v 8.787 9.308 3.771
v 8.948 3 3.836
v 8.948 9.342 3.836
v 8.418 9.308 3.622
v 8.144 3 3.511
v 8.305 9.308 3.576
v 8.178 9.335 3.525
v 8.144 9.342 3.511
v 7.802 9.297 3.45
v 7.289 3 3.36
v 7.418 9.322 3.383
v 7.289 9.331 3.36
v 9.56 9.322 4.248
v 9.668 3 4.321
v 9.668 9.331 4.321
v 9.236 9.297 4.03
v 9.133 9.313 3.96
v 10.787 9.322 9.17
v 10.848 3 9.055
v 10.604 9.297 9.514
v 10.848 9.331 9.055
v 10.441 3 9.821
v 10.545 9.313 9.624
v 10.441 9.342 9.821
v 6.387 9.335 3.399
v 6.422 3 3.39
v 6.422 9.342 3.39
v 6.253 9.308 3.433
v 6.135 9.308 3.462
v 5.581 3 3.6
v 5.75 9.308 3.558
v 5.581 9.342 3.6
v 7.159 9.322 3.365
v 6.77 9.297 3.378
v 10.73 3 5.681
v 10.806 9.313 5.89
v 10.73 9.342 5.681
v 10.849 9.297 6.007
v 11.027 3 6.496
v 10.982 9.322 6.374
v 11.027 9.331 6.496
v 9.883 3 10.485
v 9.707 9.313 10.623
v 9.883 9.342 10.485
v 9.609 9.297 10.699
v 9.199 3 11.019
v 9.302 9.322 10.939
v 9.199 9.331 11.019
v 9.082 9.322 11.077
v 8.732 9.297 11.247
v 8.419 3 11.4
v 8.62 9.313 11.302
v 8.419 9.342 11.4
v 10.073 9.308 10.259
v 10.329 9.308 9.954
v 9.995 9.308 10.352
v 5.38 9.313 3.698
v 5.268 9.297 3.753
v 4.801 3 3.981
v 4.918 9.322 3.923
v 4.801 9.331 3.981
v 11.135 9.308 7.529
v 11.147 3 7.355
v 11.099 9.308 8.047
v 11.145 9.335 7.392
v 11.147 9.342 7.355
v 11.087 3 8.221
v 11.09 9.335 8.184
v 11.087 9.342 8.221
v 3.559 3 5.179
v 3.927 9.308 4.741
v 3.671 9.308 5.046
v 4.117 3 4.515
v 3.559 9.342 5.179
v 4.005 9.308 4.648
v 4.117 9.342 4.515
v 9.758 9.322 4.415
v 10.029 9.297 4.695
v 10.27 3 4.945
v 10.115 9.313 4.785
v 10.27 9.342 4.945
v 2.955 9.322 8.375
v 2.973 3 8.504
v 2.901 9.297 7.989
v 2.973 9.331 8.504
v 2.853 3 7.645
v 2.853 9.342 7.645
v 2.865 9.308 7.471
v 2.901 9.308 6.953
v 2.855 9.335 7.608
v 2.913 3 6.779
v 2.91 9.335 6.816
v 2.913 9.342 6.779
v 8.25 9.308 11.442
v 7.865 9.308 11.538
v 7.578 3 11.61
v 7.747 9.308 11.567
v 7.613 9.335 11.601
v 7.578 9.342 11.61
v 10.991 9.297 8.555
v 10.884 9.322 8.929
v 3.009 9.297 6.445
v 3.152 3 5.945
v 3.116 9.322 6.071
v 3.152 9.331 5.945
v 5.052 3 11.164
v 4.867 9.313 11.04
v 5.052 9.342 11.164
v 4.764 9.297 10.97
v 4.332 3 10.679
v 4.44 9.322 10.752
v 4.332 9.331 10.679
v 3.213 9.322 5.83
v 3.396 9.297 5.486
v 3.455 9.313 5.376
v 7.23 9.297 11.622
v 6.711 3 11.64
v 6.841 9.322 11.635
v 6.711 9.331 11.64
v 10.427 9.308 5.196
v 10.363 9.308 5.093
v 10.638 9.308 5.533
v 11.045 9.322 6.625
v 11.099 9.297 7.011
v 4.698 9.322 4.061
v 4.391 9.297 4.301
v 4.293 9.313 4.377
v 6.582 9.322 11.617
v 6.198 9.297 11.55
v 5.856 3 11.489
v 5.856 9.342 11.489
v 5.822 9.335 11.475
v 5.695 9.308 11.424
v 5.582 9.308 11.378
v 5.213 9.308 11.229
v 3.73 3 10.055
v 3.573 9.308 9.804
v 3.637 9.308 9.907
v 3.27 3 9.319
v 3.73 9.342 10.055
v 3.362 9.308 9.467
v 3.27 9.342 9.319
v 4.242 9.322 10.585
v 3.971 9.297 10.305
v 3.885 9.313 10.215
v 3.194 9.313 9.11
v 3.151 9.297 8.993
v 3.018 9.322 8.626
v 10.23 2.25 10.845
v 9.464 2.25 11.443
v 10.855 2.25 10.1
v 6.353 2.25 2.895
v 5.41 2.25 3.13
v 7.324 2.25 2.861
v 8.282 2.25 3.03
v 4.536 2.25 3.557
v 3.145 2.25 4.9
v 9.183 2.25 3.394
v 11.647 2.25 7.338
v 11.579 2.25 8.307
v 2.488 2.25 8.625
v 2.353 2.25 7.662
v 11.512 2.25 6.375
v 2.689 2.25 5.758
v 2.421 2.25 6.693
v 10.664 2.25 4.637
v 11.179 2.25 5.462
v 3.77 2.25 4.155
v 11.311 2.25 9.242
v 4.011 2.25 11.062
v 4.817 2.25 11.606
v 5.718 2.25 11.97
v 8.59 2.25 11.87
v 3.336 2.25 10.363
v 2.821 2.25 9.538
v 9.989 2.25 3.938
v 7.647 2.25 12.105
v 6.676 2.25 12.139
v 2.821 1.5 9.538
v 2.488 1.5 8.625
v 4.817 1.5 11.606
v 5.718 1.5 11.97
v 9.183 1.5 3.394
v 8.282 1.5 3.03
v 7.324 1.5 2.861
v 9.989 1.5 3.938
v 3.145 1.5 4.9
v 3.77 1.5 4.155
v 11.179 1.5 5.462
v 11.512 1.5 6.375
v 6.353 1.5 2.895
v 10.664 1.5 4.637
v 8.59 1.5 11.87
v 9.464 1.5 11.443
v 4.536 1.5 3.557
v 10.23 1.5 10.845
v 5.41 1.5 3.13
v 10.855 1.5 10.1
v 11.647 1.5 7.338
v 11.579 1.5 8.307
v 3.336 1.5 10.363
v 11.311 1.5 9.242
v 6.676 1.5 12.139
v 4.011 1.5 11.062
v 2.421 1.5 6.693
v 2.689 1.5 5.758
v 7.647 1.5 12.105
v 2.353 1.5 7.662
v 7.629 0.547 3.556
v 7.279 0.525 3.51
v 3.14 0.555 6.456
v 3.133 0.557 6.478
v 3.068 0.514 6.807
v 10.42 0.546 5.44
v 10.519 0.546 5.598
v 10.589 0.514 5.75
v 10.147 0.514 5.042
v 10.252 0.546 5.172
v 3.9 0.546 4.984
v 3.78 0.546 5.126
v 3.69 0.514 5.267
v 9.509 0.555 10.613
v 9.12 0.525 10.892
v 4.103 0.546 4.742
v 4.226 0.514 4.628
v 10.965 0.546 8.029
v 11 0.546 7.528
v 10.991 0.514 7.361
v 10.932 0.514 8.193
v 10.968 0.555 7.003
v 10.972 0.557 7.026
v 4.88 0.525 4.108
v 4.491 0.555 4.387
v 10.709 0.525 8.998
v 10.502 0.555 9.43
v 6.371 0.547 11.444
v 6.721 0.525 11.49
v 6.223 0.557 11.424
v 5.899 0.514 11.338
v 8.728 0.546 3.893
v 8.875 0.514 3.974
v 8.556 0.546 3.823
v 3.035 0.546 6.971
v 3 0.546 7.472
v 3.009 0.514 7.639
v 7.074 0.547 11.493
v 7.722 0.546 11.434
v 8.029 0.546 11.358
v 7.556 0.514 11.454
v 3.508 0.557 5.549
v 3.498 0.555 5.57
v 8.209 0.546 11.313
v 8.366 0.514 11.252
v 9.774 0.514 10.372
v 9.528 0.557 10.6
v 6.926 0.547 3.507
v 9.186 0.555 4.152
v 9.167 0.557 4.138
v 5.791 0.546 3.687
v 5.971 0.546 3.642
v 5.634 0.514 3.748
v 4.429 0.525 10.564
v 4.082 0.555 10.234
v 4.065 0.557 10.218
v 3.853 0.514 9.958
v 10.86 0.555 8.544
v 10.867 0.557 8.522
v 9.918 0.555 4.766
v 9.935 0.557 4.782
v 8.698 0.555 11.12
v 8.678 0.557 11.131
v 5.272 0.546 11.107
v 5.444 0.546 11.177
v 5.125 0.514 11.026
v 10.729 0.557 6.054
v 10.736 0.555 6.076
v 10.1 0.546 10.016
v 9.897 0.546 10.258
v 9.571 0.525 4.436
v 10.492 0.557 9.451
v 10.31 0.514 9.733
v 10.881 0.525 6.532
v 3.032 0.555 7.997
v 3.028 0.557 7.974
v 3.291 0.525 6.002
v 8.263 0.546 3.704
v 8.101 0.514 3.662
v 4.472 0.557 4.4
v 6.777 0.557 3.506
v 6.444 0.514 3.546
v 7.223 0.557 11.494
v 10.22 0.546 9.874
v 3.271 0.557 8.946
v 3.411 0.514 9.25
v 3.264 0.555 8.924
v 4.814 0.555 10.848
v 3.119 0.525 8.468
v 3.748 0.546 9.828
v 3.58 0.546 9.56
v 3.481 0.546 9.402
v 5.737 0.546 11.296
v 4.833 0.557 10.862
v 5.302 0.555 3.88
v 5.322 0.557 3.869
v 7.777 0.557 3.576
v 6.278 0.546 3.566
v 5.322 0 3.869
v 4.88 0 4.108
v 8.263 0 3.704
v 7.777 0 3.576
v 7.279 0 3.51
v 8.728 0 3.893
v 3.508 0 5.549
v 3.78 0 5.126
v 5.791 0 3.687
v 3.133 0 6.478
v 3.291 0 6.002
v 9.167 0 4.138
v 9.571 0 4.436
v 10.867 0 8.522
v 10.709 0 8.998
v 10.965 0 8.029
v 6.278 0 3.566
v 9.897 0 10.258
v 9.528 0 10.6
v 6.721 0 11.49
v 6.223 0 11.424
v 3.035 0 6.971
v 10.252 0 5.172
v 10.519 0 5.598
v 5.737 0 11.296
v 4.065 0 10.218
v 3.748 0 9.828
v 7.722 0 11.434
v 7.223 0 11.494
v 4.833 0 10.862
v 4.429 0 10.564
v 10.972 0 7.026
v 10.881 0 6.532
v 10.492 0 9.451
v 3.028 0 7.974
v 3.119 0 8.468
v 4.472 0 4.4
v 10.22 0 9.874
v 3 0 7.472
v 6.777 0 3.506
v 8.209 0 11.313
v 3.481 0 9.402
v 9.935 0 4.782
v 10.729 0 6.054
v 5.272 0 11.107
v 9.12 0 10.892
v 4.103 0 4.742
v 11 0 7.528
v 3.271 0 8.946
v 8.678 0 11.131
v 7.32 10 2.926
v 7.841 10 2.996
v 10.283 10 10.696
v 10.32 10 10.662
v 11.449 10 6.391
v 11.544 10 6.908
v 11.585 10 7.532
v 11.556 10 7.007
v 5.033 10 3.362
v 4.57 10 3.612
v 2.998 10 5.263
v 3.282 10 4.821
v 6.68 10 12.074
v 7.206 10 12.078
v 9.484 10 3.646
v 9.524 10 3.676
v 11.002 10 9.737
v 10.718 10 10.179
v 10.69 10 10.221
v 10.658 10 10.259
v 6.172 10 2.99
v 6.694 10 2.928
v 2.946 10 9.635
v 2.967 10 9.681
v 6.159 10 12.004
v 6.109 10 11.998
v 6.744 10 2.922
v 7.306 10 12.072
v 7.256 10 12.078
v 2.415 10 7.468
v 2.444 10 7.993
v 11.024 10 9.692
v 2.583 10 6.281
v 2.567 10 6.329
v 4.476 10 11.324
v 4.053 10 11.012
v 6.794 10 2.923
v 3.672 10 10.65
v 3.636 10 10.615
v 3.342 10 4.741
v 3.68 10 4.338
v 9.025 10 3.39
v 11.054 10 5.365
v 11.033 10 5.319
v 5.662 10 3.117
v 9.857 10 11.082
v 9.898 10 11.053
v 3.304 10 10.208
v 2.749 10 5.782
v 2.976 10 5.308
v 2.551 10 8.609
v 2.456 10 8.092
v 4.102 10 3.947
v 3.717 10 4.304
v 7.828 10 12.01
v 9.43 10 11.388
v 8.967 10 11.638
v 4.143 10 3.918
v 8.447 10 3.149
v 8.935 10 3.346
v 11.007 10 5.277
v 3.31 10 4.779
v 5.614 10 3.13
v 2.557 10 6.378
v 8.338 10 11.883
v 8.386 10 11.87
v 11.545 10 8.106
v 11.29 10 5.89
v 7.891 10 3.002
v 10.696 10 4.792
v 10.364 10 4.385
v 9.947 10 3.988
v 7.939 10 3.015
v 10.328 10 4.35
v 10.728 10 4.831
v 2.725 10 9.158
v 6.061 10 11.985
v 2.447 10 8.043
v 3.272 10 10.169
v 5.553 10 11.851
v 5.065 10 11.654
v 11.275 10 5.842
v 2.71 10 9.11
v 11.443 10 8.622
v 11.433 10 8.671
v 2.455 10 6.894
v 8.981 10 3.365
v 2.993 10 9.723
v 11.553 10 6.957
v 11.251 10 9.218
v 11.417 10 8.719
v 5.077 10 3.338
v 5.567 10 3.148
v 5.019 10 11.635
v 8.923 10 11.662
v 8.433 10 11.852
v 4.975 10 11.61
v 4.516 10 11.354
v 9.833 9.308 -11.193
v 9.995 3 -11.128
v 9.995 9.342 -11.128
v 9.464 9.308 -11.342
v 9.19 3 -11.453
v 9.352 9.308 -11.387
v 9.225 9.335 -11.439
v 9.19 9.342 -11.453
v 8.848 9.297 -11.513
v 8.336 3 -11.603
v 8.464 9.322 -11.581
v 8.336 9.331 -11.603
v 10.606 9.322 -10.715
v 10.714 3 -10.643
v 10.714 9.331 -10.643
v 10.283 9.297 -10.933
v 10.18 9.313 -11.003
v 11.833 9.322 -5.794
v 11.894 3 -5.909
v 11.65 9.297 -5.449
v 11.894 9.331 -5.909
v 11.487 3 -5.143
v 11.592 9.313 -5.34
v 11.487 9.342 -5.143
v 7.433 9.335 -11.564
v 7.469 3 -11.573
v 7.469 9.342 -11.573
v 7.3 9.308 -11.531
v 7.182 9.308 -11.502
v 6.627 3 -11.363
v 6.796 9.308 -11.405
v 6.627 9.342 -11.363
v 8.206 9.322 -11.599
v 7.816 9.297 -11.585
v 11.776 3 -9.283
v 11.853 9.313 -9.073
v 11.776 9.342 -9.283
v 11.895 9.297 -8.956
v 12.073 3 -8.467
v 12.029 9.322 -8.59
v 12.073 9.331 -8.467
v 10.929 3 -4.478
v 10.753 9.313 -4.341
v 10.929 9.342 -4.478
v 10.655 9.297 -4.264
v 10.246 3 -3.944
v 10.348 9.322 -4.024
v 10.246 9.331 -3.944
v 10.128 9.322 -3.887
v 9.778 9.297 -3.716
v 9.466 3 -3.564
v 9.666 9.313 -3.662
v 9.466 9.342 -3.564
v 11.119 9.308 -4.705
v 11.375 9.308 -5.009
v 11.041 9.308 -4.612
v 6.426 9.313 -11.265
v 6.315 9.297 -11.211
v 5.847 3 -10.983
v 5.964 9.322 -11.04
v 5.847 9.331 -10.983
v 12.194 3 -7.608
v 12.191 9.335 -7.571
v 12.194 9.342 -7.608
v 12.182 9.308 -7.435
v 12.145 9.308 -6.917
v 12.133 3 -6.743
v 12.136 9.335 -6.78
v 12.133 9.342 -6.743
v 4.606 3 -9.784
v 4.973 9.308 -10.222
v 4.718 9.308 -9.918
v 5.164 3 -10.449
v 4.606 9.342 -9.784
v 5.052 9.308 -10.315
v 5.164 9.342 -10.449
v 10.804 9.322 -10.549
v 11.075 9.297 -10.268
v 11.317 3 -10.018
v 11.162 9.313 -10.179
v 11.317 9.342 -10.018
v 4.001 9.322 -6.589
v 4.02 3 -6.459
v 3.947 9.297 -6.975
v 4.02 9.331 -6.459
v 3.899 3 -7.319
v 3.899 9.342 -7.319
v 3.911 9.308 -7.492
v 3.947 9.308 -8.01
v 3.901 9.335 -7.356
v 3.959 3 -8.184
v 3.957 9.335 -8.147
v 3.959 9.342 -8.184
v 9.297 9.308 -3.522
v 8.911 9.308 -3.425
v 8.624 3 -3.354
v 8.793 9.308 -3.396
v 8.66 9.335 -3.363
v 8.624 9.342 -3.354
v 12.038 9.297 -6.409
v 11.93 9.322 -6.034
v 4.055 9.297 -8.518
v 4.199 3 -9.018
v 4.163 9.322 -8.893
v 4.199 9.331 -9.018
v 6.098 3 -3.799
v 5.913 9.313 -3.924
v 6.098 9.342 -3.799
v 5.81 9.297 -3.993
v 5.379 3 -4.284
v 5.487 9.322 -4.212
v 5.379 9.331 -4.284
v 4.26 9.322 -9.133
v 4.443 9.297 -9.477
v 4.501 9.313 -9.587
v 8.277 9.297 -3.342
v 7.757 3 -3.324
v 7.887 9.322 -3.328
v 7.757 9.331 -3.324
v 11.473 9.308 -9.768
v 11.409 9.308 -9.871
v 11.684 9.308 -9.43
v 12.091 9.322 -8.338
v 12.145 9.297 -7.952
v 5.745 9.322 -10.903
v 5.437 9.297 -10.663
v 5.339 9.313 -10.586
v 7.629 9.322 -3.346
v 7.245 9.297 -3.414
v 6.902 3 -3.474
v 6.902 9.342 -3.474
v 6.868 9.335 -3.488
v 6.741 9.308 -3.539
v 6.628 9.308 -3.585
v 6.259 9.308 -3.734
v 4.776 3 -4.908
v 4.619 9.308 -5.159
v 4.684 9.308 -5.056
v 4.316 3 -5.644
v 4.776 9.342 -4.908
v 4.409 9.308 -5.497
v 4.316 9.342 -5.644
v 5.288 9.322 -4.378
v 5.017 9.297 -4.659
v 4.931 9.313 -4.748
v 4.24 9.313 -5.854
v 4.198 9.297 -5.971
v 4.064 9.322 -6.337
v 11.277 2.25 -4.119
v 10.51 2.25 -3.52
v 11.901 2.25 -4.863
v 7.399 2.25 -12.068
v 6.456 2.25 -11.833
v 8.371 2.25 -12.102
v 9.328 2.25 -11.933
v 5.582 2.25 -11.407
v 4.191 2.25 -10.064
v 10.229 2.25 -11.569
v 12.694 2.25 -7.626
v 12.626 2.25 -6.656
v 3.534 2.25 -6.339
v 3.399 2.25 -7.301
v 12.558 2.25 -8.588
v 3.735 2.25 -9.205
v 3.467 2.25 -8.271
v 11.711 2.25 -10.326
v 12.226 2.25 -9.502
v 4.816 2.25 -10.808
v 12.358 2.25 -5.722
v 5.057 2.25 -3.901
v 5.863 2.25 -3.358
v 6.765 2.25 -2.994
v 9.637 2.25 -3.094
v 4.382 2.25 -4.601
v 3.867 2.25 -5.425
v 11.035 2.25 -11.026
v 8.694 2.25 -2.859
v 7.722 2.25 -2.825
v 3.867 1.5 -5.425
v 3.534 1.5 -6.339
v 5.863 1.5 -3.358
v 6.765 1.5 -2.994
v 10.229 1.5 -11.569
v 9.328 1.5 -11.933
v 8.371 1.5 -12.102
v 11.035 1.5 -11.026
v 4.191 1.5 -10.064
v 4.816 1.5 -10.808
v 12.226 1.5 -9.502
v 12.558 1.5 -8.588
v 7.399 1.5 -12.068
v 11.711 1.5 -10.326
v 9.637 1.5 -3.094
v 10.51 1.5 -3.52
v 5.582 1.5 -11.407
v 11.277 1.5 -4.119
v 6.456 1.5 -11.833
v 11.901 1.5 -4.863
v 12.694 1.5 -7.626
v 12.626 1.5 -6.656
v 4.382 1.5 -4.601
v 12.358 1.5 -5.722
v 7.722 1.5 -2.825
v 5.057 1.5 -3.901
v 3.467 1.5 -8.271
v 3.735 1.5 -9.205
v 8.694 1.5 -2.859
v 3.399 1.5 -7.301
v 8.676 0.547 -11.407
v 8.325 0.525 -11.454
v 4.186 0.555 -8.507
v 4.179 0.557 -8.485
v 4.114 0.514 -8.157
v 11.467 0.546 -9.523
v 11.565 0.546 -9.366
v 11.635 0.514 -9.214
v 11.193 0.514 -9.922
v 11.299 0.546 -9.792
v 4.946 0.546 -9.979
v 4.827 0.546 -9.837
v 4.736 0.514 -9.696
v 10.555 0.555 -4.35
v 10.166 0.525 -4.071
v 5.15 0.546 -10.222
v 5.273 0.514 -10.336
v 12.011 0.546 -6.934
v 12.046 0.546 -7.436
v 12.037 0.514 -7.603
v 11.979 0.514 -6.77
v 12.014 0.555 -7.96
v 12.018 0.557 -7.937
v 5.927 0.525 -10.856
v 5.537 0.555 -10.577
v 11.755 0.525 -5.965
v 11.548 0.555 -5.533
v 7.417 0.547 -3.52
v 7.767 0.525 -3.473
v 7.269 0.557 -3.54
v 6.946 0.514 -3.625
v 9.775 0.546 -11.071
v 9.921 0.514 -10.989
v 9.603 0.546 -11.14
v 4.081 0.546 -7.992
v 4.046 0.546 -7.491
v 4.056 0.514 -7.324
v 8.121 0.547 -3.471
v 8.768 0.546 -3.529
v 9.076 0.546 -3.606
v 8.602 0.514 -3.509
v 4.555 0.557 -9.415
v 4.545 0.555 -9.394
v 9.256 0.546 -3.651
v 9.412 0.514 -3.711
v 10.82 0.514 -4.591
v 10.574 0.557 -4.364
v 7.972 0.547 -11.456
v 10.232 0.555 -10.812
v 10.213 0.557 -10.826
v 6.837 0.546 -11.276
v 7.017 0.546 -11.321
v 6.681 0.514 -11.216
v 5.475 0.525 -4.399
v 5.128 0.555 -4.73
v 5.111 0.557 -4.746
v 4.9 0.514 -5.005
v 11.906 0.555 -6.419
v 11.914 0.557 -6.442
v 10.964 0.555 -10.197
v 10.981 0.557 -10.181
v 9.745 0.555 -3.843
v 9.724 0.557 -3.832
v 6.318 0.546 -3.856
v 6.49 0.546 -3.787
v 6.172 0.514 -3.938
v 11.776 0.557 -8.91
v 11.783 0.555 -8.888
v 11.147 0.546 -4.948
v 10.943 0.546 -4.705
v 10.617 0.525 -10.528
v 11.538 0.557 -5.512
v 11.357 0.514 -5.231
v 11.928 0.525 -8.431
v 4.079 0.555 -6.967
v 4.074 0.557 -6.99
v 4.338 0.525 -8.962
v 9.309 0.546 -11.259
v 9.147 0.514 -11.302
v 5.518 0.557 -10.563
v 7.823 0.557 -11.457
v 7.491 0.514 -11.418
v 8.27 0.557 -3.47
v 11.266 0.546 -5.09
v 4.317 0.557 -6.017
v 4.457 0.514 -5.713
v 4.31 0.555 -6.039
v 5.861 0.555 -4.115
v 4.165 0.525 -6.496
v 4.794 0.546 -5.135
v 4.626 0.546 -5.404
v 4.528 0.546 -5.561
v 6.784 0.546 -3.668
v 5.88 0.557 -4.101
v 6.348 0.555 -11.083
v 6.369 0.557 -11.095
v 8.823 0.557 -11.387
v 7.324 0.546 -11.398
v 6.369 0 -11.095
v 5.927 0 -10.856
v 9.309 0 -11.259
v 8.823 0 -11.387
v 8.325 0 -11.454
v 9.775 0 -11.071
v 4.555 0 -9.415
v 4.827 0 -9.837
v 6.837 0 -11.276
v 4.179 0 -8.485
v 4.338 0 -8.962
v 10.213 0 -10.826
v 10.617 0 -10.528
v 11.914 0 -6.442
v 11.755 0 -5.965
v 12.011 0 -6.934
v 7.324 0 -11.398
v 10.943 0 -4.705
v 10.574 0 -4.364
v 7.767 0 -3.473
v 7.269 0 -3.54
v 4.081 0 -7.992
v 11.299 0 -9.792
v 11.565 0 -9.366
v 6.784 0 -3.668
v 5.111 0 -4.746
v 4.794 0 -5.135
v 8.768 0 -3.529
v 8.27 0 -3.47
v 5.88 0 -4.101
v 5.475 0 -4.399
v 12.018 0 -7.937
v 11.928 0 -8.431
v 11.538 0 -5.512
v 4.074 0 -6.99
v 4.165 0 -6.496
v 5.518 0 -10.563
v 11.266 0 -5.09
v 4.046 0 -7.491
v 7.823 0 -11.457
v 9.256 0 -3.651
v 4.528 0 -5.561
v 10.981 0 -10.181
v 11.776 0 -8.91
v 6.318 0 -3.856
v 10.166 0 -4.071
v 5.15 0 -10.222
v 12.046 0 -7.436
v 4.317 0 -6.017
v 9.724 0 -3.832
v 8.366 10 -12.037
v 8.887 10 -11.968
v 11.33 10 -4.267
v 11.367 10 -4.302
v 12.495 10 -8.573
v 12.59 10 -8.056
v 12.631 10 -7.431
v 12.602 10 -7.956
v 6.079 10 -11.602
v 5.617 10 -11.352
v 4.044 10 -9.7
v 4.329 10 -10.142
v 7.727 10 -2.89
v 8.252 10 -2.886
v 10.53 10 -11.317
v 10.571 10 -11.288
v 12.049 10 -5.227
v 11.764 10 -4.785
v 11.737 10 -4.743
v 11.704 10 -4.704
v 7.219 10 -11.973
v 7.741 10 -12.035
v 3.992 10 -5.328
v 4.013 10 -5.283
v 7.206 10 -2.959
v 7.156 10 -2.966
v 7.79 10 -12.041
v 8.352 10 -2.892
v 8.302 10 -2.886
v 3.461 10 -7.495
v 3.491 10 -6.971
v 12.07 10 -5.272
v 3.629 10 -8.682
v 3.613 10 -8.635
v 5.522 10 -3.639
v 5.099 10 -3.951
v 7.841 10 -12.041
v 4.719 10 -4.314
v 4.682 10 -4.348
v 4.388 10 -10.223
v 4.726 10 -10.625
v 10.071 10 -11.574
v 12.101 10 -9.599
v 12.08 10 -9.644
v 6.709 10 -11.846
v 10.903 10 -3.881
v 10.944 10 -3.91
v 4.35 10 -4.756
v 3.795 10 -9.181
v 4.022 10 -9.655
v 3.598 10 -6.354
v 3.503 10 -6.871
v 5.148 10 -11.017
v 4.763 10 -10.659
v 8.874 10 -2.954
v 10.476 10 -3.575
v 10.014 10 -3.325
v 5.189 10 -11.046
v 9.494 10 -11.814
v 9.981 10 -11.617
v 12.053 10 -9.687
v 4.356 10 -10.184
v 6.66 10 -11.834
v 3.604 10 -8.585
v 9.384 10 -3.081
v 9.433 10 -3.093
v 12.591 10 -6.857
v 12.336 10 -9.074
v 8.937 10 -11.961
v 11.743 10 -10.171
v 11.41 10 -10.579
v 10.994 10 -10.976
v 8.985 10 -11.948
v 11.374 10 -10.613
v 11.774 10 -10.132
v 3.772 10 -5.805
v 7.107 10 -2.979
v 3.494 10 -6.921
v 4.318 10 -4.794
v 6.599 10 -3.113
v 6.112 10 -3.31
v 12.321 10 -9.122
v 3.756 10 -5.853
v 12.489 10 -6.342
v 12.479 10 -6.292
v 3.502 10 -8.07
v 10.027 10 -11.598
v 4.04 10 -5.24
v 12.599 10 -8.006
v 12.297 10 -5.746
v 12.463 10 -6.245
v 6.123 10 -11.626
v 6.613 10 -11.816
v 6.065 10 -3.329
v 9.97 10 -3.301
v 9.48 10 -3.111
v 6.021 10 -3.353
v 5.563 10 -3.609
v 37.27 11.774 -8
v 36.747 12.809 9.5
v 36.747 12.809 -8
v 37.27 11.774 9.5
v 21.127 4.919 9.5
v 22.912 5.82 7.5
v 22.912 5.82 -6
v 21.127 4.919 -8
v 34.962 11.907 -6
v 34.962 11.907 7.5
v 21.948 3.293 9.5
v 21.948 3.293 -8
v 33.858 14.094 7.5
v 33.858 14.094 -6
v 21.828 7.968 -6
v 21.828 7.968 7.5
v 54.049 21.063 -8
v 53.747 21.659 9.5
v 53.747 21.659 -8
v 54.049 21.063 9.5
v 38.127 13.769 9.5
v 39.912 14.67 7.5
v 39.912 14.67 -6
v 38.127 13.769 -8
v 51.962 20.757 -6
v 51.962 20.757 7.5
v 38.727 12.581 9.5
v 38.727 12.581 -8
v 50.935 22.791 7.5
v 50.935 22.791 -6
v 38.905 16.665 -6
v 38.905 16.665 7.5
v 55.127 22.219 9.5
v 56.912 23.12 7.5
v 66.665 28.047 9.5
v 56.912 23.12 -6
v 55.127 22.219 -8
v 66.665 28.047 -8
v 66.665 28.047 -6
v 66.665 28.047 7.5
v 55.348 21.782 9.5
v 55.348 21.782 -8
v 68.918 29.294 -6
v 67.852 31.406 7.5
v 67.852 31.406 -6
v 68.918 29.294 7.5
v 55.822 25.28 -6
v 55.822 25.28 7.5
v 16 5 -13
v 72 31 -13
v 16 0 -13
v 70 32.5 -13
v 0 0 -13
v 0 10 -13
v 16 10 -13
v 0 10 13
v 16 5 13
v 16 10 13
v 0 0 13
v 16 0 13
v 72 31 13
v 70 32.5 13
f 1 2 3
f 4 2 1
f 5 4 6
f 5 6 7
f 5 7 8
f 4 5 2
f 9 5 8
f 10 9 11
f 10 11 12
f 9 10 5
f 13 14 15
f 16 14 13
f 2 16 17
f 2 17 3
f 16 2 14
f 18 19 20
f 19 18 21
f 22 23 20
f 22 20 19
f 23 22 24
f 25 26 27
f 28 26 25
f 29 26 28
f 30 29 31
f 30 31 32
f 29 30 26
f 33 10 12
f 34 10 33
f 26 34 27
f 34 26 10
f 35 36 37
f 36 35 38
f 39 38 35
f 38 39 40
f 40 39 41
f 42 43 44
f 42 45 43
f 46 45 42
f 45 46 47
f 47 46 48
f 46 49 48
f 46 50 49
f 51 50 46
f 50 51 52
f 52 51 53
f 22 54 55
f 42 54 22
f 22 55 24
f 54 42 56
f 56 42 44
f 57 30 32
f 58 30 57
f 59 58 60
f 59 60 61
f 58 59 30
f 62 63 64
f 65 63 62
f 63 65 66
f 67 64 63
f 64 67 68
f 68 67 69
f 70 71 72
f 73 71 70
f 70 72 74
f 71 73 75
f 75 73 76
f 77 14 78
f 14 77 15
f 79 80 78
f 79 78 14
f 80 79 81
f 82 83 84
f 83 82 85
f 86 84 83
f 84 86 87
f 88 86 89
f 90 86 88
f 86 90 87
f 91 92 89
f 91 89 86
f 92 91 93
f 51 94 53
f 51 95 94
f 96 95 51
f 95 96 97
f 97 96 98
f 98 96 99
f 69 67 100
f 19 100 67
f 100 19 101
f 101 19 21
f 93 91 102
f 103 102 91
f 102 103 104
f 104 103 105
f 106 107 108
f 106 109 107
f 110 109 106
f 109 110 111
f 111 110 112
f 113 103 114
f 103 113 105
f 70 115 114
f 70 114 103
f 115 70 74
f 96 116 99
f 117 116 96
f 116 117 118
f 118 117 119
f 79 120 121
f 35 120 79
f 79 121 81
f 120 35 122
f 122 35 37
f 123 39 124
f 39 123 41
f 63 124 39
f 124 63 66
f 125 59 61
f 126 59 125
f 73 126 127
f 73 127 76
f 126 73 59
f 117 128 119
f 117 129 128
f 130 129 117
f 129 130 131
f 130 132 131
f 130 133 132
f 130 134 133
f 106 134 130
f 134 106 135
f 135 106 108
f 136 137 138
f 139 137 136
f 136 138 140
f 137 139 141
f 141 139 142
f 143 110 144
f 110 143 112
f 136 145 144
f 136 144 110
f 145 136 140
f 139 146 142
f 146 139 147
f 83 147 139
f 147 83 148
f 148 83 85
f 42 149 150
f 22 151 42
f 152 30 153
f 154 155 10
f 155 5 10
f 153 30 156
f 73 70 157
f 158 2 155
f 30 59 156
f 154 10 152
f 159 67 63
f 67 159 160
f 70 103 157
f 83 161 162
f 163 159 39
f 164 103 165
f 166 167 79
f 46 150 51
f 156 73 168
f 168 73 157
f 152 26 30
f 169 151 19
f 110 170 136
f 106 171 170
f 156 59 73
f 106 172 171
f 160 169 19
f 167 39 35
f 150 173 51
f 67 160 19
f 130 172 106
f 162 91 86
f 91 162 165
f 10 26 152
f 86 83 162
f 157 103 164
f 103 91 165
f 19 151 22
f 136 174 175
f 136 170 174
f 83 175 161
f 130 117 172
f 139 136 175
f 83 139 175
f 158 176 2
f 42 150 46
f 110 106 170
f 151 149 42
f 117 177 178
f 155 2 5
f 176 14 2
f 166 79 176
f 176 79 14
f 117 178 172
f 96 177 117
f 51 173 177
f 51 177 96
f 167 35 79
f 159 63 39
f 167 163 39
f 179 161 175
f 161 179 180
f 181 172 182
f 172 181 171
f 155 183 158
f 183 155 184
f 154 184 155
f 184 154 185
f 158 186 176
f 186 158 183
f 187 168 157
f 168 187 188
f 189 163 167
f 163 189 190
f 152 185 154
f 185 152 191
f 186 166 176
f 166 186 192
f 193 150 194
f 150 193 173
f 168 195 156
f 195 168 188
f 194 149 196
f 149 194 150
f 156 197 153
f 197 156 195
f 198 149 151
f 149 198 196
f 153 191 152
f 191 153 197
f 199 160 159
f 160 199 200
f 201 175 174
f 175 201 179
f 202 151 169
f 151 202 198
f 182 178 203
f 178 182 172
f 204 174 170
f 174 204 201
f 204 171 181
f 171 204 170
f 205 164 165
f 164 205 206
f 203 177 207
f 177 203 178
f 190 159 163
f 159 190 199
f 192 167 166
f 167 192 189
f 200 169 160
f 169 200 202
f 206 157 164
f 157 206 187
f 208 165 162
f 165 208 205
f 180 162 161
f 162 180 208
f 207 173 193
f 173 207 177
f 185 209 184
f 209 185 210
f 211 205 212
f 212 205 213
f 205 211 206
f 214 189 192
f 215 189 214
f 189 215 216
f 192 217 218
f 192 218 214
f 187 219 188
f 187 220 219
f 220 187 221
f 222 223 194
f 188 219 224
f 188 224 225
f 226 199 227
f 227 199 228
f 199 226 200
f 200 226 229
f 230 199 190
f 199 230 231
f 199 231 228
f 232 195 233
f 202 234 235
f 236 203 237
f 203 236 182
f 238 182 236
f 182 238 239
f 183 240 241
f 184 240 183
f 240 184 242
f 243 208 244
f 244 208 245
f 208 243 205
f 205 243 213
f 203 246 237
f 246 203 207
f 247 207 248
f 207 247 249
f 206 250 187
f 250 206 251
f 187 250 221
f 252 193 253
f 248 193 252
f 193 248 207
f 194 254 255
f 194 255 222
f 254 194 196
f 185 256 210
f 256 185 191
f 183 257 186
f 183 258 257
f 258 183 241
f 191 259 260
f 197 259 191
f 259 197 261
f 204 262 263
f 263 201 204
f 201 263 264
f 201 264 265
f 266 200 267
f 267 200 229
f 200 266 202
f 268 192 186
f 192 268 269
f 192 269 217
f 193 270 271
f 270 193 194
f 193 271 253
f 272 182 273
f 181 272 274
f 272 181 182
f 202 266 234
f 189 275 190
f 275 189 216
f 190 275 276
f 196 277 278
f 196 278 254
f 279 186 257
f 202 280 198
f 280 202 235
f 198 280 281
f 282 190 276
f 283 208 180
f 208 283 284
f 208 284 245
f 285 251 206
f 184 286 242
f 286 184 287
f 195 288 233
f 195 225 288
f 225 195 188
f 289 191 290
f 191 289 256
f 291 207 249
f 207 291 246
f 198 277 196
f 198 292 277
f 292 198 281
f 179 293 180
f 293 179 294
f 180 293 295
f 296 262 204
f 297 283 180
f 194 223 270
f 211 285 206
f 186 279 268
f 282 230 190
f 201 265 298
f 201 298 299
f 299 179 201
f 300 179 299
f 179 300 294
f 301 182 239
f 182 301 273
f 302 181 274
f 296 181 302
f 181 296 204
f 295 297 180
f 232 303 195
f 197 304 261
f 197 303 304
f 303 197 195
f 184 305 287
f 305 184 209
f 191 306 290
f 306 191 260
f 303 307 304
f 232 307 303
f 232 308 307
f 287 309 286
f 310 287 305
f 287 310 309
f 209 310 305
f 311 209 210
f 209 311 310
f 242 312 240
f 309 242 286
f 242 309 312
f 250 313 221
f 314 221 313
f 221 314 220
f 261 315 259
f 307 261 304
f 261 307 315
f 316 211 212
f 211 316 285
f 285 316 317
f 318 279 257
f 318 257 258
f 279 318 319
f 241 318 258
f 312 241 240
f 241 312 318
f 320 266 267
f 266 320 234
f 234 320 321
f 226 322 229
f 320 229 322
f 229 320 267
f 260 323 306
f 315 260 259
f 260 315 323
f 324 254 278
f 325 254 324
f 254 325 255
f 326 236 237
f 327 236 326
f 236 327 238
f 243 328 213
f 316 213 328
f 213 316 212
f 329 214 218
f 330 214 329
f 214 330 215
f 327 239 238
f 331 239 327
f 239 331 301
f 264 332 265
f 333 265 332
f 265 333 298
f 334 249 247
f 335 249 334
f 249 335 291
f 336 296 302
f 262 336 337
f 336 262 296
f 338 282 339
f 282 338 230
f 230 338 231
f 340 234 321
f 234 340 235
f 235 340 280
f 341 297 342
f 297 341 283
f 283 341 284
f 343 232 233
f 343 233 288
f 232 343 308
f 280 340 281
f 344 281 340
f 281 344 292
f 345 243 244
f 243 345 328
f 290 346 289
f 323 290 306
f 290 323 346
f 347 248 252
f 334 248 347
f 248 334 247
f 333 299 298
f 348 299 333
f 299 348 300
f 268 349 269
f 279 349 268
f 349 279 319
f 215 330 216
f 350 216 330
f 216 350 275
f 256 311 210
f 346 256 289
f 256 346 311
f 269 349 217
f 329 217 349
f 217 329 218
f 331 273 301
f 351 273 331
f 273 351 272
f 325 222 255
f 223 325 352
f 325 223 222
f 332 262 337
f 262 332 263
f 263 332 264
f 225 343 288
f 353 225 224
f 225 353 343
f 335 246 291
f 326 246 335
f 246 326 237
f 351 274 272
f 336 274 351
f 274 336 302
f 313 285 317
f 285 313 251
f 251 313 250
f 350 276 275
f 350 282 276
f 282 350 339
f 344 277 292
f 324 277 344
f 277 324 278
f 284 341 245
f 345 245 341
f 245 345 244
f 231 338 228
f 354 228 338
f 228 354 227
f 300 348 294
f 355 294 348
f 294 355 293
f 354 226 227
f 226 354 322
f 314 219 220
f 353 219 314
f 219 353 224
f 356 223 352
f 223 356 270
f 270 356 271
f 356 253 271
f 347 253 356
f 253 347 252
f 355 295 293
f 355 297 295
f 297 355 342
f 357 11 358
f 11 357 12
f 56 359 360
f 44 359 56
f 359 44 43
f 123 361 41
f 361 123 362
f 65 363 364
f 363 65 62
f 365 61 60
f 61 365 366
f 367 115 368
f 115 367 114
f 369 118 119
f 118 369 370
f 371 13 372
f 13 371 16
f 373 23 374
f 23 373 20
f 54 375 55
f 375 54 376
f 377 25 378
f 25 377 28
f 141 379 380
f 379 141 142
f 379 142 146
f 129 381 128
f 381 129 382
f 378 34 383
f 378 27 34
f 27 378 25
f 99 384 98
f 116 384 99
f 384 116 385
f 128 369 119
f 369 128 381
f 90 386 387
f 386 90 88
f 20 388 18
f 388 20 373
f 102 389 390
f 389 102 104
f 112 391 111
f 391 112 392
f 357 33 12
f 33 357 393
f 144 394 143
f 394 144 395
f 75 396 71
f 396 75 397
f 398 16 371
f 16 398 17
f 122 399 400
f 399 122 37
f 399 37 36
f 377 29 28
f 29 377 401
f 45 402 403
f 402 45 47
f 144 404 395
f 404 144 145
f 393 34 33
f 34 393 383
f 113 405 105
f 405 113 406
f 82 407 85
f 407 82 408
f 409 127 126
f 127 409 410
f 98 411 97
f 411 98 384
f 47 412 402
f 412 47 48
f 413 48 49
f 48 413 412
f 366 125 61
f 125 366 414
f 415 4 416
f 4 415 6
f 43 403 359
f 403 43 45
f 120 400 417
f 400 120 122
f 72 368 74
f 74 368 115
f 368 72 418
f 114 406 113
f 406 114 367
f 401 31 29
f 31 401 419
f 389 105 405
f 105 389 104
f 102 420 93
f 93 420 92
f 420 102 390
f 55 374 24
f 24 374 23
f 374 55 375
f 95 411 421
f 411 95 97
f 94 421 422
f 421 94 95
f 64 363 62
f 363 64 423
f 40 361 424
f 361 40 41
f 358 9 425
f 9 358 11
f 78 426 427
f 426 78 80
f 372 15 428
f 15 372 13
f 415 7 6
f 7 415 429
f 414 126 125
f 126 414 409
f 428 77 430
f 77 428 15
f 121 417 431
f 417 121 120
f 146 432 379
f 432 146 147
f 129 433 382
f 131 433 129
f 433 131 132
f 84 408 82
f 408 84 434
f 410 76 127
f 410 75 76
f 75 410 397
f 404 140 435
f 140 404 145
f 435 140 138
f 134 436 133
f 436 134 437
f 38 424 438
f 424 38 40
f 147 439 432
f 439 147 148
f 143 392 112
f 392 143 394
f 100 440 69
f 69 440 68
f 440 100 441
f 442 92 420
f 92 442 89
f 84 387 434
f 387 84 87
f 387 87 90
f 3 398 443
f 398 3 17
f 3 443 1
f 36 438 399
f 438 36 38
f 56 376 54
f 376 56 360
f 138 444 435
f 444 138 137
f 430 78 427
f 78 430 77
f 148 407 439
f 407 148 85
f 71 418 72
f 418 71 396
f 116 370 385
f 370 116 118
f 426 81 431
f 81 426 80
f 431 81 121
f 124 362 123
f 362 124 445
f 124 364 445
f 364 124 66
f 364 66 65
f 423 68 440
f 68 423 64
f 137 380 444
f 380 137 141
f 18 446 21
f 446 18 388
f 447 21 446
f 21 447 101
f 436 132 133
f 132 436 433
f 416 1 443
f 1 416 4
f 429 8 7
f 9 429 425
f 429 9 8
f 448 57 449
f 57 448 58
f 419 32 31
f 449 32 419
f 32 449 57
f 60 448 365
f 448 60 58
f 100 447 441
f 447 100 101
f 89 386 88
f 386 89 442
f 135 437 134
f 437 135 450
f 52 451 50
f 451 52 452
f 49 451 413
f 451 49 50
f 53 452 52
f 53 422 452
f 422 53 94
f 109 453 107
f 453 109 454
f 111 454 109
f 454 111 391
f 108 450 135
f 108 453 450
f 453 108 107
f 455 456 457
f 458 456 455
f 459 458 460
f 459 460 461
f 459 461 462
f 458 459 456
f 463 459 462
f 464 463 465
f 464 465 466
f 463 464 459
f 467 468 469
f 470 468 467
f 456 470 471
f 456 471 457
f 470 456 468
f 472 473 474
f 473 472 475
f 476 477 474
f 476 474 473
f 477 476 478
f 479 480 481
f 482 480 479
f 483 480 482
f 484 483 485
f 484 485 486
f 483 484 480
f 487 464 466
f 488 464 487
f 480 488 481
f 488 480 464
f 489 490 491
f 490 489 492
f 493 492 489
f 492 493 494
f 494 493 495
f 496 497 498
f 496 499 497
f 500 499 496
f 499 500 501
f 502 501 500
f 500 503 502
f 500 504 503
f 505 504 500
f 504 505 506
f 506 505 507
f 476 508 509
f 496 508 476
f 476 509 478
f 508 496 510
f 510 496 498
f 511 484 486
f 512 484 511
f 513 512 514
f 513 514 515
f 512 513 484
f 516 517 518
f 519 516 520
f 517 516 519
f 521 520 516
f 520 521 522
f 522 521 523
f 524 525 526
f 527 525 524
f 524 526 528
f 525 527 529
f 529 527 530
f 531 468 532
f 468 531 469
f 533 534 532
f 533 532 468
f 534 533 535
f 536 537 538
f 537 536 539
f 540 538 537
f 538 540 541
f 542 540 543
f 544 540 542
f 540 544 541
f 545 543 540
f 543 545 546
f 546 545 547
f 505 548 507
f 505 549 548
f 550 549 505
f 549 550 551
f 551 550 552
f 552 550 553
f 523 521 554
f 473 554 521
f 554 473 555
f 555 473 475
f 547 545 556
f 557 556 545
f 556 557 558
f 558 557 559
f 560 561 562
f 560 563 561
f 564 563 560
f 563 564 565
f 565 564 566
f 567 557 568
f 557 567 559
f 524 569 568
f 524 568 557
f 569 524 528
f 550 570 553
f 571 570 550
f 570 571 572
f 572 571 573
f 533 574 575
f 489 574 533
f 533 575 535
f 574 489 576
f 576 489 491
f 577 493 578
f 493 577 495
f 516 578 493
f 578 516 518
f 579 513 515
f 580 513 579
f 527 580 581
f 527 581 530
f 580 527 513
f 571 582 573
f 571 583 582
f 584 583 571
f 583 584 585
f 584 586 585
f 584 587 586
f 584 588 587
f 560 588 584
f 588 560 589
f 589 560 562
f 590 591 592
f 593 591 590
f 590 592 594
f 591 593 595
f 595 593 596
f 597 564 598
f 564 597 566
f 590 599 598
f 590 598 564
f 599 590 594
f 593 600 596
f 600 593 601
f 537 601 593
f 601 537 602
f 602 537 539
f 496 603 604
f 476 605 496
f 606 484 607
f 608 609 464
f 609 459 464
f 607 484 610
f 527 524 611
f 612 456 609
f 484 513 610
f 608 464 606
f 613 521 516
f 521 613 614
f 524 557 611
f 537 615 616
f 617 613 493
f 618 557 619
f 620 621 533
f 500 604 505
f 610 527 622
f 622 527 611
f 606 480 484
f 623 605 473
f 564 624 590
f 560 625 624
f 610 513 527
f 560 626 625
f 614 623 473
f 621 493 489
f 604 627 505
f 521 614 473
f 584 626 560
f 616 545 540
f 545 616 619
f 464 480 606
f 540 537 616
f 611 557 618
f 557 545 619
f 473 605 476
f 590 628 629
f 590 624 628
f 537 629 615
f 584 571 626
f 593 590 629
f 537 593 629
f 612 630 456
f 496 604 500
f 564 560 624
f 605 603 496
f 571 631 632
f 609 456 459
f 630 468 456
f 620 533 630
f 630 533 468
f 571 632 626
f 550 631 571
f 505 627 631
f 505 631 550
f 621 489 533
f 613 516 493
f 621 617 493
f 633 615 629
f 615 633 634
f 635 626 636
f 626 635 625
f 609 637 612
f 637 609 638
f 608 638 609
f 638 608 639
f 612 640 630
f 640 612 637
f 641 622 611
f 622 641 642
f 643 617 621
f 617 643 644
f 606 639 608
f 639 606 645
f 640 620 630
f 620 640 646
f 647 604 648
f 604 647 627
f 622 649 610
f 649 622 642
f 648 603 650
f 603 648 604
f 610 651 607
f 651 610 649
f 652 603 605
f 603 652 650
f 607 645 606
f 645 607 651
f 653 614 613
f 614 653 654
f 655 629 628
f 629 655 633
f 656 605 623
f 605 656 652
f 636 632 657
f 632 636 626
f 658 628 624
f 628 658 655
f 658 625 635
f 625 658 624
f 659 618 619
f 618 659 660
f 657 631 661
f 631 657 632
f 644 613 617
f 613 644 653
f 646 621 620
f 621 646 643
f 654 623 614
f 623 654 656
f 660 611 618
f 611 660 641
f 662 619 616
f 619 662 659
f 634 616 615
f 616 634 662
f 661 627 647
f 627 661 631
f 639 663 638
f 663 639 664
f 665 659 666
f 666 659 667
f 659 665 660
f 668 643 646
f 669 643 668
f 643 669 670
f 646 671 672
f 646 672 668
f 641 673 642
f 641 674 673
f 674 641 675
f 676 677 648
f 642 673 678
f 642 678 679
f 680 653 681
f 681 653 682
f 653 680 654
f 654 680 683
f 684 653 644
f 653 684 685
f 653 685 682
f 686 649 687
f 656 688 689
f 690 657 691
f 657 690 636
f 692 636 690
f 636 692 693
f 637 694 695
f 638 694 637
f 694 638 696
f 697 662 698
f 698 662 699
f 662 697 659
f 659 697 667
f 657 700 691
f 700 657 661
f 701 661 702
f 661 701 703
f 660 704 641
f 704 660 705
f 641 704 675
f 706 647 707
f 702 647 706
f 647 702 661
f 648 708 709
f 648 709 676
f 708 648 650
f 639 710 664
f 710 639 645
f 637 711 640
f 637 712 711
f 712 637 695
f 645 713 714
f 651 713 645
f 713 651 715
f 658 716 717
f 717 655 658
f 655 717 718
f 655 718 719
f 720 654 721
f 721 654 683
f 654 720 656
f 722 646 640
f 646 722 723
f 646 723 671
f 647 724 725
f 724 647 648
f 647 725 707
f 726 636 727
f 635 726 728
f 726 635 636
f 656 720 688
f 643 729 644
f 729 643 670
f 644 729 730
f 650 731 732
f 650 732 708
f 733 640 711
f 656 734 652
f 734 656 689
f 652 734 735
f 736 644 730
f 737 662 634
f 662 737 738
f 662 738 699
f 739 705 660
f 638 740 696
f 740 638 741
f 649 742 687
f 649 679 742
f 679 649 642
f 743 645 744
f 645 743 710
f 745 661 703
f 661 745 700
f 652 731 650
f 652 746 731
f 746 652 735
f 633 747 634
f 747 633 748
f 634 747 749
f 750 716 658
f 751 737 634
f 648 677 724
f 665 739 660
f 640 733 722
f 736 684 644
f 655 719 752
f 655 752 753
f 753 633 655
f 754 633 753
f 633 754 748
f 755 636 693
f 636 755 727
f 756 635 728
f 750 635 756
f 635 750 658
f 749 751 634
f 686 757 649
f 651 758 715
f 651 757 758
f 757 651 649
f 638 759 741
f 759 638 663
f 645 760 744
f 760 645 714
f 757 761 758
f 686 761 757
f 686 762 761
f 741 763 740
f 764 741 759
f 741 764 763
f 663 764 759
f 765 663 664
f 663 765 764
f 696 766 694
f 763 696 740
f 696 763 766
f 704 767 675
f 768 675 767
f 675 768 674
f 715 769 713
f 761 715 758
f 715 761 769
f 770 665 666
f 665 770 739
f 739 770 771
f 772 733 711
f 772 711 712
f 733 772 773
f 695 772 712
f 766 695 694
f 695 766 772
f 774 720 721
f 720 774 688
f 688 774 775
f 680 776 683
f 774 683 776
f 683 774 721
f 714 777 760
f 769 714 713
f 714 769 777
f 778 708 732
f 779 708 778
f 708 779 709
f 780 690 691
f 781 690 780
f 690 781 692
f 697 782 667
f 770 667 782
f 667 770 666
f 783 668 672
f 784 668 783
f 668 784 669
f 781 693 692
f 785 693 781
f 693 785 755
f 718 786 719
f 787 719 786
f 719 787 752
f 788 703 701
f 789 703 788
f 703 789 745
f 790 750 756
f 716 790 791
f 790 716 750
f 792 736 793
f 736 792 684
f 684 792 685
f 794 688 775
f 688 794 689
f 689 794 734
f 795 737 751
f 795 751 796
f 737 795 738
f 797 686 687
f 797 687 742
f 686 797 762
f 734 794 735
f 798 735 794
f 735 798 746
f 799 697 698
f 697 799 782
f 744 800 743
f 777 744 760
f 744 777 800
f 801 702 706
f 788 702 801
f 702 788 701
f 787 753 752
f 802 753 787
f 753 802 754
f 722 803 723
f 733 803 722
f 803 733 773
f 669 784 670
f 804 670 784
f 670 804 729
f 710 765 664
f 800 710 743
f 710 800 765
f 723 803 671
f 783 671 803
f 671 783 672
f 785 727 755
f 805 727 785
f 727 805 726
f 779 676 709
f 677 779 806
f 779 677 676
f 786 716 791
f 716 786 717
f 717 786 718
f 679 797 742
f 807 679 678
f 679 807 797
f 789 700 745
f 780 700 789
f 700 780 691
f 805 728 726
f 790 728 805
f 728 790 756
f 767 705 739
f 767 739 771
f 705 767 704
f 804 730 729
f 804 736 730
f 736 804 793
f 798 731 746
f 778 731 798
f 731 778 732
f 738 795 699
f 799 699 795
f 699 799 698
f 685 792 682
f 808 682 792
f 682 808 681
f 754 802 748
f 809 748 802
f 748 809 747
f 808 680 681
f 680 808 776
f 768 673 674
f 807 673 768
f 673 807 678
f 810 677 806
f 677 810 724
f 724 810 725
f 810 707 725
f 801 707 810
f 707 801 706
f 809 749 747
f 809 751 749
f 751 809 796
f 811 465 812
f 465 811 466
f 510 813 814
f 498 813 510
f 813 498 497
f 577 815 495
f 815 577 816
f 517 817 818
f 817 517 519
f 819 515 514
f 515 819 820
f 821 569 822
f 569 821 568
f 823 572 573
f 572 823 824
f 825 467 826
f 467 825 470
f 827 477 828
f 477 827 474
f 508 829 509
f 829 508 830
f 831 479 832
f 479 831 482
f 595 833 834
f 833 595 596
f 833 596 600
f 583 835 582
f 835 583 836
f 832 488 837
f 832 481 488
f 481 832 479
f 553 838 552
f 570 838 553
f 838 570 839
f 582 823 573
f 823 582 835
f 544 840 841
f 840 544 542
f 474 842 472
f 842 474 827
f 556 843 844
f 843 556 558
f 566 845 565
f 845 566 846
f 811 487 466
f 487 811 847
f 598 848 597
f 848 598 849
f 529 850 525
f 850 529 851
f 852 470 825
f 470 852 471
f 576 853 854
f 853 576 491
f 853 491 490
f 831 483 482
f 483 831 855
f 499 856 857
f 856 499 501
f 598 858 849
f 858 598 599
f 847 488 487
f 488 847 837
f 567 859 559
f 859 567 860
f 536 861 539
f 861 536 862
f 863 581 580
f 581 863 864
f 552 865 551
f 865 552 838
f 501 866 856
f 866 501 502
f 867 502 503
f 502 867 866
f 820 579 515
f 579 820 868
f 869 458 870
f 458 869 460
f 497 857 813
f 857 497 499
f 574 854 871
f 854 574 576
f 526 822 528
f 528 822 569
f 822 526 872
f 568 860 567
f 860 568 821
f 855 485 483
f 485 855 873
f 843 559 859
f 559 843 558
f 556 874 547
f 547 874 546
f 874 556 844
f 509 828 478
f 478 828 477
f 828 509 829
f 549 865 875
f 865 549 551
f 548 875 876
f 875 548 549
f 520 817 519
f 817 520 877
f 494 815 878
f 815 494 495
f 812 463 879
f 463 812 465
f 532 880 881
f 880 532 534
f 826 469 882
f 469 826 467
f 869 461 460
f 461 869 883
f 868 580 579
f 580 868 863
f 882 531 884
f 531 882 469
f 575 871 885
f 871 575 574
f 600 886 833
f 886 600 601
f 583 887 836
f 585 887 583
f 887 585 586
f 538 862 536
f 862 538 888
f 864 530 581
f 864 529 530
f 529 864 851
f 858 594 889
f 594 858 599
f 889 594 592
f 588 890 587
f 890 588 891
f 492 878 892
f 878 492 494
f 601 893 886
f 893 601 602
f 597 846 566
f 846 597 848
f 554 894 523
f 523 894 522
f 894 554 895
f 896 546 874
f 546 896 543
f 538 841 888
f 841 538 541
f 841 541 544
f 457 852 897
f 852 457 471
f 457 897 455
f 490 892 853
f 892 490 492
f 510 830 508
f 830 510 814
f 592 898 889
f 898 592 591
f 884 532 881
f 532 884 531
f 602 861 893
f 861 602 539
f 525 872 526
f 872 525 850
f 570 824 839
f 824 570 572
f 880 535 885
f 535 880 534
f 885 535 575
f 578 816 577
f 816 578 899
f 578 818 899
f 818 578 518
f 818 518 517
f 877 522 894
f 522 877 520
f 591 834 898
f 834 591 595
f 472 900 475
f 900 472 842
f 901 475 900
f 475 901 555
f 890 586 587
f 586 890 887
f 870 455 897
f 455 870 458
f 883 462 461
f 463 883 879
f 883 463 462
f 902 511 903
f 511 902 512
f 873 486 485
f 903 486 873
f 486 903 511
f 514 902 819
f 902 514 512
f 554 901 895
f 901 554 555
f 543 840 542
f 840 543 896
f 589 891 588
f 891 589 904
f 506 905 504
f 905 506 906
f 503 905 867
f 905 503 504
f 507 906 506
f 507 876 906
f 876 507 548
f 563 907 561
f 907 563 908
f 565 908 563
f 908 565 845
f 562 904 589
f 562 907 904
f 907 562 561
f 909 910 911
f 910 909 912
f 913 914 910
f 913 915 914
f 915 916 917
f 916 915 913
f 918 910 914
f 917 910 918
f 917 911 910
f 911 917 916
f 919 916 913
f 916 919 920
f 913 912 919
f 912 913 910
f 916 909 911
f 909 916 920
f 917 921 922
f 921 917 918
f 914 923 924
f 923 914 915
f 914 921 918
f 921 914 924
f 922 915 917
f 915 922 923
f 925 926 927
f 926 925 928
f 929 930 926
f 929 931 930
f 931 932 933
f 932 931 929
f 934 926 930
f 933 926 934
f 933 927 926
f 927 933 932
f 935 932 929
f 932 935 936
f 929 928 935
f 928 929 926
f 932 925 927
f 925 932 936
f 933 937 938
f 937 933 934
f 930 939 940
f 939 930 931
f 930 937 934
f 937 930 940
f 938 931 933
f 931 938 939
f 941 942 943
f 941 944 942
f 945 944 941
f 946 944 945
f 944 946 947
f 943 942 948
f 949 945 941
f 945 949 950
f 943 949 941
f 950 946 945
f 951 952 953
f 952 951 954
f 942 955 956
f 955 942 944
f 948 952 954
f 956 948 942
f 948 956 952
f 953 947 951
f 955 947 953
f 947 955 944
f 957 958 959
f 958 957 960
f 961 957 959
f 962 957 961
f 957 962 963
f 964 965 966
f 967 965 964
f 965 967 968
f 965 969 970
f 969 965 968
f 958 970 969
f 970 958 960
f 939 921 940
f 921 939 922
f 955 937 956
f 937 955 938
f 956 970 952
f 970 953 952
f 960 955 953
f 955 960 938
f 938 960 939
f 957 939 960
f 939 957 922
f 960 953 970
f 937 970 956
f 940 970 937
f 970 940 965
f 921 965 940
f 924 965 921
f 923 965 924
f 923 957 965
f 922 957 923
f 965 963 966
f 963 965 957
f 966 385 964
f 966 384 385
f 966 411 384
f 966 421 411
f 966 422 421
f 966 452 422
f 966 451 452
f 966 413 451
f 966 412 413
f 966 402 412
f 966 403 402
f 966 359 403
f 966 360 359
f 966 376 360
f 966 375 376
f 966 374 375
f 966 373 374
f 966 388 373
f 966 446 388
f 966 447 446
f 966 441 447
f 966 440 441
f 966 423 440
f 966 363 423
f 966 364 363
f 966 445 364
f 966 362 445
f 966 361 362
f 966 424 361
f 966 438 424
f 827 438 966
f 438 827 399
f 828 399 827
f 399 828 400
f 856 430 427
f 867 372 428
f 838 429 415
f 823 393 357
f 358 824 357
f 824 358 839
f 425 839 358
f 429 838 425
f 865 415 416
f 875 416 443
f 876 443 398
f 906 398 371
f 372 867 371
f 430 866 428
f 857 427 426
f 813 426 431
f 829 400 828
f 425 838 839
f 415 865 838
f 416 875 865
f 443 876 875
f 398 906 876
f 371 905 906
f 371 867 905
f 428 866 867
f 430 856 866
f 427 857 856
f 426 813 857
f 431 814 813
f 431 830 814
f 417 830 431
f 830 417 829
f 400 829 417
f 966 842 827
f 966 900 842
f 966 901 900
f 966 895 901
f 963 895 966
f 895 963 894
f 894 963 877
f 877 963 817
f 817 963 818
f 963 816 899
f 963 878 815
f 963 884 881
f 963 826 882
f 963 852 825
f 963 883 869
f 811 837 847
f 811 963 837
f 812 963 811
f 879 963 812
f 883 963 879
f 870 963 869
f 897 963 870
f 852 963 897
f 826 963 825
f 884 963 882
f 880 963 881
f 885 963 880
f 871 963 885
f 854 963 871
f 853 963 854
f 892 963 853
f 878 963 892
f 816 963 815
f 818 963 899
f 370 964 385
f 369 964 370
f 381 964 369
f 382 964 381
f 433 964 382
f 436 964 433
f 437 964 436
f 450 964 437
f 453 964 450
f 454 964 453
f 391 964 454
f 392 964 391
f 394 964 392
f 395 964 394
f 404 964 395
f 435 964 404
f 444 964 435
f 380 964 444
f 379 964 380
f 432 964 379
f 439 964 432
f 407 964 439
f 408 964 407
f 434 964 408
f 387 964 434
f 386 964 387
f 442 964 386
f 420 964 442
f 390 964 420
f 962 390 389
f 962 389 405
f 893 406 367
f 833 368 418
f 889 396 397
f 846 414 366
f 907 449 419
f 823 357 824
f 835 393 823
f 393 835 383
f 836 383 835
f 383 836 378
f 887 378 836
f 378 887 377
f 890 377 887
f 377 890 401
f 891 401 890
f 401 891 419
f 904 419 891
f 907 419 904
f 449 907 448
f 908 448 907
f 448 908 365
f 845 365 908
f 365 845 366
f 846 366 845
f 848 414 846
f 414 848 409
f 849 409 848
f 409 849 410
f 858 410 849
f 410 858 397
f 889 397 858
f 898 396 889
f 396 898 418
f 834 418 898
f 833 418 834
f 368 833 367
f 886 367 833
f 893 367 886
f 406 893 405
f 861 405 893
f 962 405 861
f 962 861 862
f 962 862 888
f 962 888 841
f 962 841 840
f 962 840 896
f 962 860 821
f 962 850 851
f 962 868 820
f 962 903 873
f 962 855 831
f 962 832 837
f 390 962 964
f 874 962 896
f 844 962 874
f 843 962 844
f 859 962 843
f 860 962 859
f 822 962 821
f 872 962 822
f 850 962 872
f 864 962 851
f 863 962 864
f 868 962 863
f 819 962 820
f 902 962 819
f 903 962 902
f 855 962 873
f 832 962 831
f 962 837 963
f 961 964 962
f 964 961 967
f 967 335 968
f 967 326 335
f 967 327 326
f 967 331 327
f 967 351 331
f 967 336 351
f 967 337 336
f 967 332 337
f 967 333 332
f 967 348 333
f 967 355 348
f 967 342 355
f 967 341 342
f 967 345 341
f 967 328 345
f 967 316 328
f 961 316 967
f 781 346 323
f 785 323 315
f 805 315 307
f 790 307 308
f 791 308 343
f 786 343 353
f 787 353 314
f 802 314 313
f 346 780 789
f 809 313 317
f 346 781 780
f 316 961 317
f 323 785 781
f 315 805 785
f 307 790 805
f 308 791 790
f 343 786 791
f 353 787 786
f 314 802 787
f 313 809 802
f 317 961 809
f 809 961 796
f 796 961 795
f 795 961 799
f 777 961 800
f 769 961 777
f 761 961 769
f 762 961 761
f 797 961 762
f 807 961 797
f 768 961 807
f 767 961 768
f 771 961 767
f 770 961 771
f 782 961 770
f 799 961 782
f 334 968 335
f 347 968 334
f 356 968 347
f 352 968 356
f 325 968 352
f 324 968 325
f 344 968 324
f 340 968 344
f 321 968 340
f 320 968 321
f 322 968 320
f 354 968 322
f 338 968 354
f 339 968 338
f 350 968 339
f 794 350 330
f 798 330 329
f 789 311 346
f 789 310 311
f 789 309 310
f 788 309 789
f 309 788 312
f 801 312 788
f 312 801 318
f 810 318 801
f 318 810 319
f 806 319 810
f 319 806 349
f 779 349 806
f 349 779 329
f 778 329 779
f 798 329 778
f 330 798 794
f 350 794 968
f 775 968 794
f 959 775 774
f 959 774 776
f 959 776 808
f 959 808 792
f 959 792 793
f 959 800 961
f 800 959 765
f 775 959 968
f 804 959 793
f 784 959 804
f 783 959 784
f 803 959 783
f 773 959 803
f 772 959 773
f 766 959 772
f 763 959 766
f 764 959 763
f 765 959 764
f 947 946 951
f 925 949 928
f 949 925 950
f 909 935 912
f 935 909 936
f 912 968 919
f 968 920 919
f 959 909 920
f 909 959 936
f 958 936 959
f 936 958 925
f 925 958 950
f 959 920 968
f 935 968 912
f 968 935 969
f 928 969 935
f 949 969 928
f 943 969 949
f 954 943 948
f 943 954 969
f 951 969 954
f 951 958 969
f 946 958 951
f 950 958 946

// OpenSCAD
// file: squarebuttonmount.scad
module squarebuttonmount_positive() {
    union() {
        translate([0,0,2.5])cube([17.5,17.5,6]);
        translate([2,2,-2.5])cube([13.5,13.5,6]);
    }
}
// file: pins.scad
// Pin Connectors V2
// Tony Buser <tbuser@gmail.com>

// pinhole(h=5);

// test();
// pintack(h=10);
// pinpeg(h=20);

module test() {
  tolerance = 0.3;
  
  translate([-12, 12, 0]) pinpeg(h=20);
  translate([12, 12, 0]) pintack(h=10);
  
  difference() {
    union() {
      translate([0, -12, 2.5]) cube(size = [59, 20, 5], center = true);
      translate([24, -12, 7.5]) cube(size = [12, 20, 15], center = true);
    }
    translate([-24, -12, 0]) pinhole(h=5, t=tolerance);
    translate([-12, -12, 0]) pinhole(h=5, t=tolerance, tight=false);
    translate([0, -12, 0]) pinhole(h=10, t=tolerance);
    translate([12, -12, 0]) pinhole(h=10, t=tolerance, tight=false);
    translate([24, -12, 15]) rotate([0, 180, 0]) pinhole(h=10, t=tolerance);
  }
}

module pinhole(h=10, r=4, lh=3, lt=1, t=0.3, tight=true) {
  union() {
    pin_solid(h, r+(t/2), lh, lt);
    cylinder(h=h+0.2, r=r);
    // widen the cylinder slightly
    // cylinder(h=h+0.2, r=r+(t-0.2/2));
    if (tight == false) {
      cylinder(h=h+0.2, r=r+(t/2)+0.25);
    }
    // widen the entrance hole to make insertion easier
    translate([0, 0, -0.1]) cylinder(h=lh/3, r2=r, r1=r+(t/2)+(lt/2));
  }
}

module pin(h=10, r=4, lh=3, lt=1, side=false) {
  if (side) {
    pin_horizontal(h, r, lh, lt);
  } else {
    pin_vertical(h, r, lh, lt);
  }
}

module pintack(h=10, r=4, lh=3, lt=1, bh=3, br=8.75) {
  union() {
    cylinder(h=bh, r=br);
    translate([0, 0, bh]) pin(h, r, lh, lt);
  }
}

module pinpeg(h=20, r=4, lh=3, lt=1) {
  union() {
    translate([0, -h/4+0.05, 0]) pin(h/2+0.1, r, lh, lt, side=true);
    translate([0, h/4-0.05, 0]) rotate([0, 0, 180]) pin(h/2+0.1, r, lh, lt, side=true);
  }
}

module pin_vertical(h=10, r=4, lh=3, lt=1) {
  difference() {
    pin_solid(h, r, lh, lt);
    
    // center cut
    translate([-r*0.5/2, -(r*2+lt*2)/2, h/4]) cube([r*0.5, r*2+lt*2, h]);
    translate([0, 0, h/4]) cylinder(h=h+lh, r=r/2.5, $fn=20);
    // center curve
    // translate([0, 0, h/4]) rotate([90, 0, 0]) cylinder(h=r*2, r=r*0.5/2, center=true, $fn=20);
  
    // side cuts
    translate([-r*2, -lt-r*1.125, -1]) cube([r*4, lt*2, h+2]);
    translate([-r*2, -lt+r*1.125, -1]) cube([r*4, lt*2, h+2]);
  }
}

// call pin with side=true instead of this
module pin_horizontal(h=10, r=4, lh=3, lt=1) {
  translate([0, h/2, r*1.125-lt]) rotate([90, 0, 0]) pin_vertical(h, r, lh, lt);
}

// this is mainly to make the pinhole module easier
module pin_solid(h=10, r=4, lh=3, lt=1) {
  union() {
    cylinder(h=h-lh, r=r, $fn=30);
    translate([0, 0, h-lh]) cylinder(h=lh*0.25, r1=r, r2=r+(lt/2), $fn=30);
    translate([0, 0, h-lh+lh*0.25]) cylinder(h=lh*0.25, r=r+(lt/2), $fn=30);    
    translate([0, 0, h-lh+lh*0.50]) cylinder(h=lh*0.50, r1=r+(lt/2), r2=r-(lt/2), $fn=30);    
  }
}

module two_pinholes() {
 pinhole();
 translate(v=[15,0,0]) pinhole();
}
// main file
include <pins.scad>
include <squarebuttonmount.scad>

$fn=50;

module two_pinholes() {

 pinhole();
 translate(v=[15,0,0]) pinhole();
}

module thumbpad() {

difference(){

  // describe shape
  linear_extrude(height = 26, center = true, convexity = 10)
  polygon([[0,0],[16,0],[72,31],[70,32.5],[16,5],[16,10],[0,10]]); 

  // mounting holes, connects to rightrack
  translate(v=[7,10,7.5]) rotate(a=[90,86,0]) two_pinholes();

  // buttonholes
  translate(v=[20,7.15,-8])  rotate(a=[90,0,26.8]) squarebuttonmount_positive();
  translate(v=[37,16,-8])  rotate(a=[90,0,26.8]) squarebuttonmount_positive();
  translate(v=[54,24.45,-8])  rotate(a=[90,0,26.8]) squarebuttonmount_positive();

  // semi design :)
  //translate(v=[12,0,12]) rotate(a=[0,15,0]) cube(size=[50,15,15]);


}

}

thumbpad();
